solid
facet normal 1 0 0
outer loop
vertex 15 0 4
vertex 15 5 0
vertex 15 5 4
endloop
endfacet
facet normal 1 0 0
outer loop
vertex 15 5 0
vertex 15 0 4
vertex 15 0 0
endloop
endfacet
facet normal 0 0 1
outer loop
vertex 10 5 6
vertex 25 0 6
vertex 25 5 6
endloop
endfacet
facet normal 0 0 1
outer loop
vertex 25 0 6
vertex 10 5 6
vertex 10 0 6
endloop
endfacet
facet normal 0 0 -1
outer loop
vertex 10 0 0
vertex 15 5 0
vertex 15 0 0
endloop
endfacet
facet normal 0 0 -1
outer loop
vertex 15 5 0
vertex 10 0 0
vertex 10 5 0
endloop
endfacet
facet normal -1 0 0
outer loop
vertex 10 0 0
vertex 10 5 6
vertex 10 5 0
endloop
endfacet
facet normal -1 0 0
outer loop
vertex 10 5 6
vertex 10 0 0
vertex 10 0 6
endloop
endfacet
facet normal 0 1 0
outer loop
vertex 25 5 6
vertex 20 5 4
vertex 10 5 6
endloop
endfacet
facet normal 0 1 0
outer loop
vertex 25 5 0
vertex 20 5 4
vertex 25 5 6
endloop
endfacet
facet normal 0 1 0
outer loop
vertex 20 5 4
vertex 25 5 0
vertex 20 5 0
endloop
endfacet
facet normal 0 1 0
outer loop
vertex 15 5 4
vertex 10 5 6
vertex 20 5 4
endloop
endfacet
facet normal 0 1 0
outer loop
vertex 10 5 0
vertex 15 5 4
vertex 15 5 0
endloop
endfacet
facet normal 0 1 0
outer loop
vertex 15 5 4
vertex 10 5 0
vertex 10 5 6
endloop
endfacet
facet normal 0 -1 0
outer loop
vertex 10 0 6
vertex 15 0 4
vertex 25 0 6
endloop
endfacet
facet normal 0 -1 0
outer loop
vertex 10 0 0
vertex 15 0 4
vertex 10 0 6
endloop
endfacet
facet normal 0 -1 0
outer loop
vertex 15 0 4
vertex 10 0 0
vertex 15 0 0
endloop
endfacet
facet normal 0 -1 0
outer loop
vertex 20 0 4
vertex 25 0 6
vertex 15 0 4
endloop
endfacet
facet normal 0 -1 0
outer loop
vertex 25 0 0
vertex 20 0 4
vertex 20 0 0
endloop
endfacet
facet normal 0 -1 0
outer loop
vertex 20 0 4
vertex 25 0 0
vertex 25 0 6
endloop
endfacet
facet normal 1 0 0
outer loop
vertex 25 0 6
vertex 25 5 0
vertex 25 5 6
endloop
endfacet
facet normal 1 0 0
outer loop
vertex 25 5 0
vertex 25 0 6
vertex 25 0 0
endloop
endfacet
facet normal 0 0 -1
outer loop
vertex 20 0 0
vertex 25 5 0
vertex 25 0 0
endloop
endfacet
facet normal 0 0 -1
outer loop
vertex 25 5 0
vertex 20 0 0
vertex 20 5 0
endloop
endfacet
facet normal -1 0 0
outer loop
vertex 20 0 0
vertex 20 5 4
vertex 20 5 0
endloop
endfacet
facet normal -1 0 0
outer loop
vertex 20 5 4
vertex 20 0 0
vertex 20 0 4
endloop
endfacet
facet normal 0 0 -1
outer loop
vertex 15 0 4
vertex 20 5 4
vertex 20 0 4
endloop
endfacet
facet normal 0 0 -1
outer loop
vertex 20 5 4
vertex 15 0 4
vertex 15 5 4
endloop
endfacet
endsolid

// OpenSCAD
// Bridges
bridge_length=5.0;
bridge_width=5.0;
bridge_height=4.0;
bridge_thick=2.0;
bridge_count=1;

for(i=[0:bridge_count-1]) {
  rotate([0,0,180*i/bridge_count]) union() {
    translate([10,0,0]) cube(size=[5,bridge_width,bridge_height+bridge_thick],center=false);
    translate([15+bridge_length,0,0]) cube(size=[5,bridge_width,bridge_height+bridge_thick],center=false);
    translate([10,0,bridge_height]) cube(size=[10+bridge_length,bridge_width,bridge_thick],center=false);
  }
}
